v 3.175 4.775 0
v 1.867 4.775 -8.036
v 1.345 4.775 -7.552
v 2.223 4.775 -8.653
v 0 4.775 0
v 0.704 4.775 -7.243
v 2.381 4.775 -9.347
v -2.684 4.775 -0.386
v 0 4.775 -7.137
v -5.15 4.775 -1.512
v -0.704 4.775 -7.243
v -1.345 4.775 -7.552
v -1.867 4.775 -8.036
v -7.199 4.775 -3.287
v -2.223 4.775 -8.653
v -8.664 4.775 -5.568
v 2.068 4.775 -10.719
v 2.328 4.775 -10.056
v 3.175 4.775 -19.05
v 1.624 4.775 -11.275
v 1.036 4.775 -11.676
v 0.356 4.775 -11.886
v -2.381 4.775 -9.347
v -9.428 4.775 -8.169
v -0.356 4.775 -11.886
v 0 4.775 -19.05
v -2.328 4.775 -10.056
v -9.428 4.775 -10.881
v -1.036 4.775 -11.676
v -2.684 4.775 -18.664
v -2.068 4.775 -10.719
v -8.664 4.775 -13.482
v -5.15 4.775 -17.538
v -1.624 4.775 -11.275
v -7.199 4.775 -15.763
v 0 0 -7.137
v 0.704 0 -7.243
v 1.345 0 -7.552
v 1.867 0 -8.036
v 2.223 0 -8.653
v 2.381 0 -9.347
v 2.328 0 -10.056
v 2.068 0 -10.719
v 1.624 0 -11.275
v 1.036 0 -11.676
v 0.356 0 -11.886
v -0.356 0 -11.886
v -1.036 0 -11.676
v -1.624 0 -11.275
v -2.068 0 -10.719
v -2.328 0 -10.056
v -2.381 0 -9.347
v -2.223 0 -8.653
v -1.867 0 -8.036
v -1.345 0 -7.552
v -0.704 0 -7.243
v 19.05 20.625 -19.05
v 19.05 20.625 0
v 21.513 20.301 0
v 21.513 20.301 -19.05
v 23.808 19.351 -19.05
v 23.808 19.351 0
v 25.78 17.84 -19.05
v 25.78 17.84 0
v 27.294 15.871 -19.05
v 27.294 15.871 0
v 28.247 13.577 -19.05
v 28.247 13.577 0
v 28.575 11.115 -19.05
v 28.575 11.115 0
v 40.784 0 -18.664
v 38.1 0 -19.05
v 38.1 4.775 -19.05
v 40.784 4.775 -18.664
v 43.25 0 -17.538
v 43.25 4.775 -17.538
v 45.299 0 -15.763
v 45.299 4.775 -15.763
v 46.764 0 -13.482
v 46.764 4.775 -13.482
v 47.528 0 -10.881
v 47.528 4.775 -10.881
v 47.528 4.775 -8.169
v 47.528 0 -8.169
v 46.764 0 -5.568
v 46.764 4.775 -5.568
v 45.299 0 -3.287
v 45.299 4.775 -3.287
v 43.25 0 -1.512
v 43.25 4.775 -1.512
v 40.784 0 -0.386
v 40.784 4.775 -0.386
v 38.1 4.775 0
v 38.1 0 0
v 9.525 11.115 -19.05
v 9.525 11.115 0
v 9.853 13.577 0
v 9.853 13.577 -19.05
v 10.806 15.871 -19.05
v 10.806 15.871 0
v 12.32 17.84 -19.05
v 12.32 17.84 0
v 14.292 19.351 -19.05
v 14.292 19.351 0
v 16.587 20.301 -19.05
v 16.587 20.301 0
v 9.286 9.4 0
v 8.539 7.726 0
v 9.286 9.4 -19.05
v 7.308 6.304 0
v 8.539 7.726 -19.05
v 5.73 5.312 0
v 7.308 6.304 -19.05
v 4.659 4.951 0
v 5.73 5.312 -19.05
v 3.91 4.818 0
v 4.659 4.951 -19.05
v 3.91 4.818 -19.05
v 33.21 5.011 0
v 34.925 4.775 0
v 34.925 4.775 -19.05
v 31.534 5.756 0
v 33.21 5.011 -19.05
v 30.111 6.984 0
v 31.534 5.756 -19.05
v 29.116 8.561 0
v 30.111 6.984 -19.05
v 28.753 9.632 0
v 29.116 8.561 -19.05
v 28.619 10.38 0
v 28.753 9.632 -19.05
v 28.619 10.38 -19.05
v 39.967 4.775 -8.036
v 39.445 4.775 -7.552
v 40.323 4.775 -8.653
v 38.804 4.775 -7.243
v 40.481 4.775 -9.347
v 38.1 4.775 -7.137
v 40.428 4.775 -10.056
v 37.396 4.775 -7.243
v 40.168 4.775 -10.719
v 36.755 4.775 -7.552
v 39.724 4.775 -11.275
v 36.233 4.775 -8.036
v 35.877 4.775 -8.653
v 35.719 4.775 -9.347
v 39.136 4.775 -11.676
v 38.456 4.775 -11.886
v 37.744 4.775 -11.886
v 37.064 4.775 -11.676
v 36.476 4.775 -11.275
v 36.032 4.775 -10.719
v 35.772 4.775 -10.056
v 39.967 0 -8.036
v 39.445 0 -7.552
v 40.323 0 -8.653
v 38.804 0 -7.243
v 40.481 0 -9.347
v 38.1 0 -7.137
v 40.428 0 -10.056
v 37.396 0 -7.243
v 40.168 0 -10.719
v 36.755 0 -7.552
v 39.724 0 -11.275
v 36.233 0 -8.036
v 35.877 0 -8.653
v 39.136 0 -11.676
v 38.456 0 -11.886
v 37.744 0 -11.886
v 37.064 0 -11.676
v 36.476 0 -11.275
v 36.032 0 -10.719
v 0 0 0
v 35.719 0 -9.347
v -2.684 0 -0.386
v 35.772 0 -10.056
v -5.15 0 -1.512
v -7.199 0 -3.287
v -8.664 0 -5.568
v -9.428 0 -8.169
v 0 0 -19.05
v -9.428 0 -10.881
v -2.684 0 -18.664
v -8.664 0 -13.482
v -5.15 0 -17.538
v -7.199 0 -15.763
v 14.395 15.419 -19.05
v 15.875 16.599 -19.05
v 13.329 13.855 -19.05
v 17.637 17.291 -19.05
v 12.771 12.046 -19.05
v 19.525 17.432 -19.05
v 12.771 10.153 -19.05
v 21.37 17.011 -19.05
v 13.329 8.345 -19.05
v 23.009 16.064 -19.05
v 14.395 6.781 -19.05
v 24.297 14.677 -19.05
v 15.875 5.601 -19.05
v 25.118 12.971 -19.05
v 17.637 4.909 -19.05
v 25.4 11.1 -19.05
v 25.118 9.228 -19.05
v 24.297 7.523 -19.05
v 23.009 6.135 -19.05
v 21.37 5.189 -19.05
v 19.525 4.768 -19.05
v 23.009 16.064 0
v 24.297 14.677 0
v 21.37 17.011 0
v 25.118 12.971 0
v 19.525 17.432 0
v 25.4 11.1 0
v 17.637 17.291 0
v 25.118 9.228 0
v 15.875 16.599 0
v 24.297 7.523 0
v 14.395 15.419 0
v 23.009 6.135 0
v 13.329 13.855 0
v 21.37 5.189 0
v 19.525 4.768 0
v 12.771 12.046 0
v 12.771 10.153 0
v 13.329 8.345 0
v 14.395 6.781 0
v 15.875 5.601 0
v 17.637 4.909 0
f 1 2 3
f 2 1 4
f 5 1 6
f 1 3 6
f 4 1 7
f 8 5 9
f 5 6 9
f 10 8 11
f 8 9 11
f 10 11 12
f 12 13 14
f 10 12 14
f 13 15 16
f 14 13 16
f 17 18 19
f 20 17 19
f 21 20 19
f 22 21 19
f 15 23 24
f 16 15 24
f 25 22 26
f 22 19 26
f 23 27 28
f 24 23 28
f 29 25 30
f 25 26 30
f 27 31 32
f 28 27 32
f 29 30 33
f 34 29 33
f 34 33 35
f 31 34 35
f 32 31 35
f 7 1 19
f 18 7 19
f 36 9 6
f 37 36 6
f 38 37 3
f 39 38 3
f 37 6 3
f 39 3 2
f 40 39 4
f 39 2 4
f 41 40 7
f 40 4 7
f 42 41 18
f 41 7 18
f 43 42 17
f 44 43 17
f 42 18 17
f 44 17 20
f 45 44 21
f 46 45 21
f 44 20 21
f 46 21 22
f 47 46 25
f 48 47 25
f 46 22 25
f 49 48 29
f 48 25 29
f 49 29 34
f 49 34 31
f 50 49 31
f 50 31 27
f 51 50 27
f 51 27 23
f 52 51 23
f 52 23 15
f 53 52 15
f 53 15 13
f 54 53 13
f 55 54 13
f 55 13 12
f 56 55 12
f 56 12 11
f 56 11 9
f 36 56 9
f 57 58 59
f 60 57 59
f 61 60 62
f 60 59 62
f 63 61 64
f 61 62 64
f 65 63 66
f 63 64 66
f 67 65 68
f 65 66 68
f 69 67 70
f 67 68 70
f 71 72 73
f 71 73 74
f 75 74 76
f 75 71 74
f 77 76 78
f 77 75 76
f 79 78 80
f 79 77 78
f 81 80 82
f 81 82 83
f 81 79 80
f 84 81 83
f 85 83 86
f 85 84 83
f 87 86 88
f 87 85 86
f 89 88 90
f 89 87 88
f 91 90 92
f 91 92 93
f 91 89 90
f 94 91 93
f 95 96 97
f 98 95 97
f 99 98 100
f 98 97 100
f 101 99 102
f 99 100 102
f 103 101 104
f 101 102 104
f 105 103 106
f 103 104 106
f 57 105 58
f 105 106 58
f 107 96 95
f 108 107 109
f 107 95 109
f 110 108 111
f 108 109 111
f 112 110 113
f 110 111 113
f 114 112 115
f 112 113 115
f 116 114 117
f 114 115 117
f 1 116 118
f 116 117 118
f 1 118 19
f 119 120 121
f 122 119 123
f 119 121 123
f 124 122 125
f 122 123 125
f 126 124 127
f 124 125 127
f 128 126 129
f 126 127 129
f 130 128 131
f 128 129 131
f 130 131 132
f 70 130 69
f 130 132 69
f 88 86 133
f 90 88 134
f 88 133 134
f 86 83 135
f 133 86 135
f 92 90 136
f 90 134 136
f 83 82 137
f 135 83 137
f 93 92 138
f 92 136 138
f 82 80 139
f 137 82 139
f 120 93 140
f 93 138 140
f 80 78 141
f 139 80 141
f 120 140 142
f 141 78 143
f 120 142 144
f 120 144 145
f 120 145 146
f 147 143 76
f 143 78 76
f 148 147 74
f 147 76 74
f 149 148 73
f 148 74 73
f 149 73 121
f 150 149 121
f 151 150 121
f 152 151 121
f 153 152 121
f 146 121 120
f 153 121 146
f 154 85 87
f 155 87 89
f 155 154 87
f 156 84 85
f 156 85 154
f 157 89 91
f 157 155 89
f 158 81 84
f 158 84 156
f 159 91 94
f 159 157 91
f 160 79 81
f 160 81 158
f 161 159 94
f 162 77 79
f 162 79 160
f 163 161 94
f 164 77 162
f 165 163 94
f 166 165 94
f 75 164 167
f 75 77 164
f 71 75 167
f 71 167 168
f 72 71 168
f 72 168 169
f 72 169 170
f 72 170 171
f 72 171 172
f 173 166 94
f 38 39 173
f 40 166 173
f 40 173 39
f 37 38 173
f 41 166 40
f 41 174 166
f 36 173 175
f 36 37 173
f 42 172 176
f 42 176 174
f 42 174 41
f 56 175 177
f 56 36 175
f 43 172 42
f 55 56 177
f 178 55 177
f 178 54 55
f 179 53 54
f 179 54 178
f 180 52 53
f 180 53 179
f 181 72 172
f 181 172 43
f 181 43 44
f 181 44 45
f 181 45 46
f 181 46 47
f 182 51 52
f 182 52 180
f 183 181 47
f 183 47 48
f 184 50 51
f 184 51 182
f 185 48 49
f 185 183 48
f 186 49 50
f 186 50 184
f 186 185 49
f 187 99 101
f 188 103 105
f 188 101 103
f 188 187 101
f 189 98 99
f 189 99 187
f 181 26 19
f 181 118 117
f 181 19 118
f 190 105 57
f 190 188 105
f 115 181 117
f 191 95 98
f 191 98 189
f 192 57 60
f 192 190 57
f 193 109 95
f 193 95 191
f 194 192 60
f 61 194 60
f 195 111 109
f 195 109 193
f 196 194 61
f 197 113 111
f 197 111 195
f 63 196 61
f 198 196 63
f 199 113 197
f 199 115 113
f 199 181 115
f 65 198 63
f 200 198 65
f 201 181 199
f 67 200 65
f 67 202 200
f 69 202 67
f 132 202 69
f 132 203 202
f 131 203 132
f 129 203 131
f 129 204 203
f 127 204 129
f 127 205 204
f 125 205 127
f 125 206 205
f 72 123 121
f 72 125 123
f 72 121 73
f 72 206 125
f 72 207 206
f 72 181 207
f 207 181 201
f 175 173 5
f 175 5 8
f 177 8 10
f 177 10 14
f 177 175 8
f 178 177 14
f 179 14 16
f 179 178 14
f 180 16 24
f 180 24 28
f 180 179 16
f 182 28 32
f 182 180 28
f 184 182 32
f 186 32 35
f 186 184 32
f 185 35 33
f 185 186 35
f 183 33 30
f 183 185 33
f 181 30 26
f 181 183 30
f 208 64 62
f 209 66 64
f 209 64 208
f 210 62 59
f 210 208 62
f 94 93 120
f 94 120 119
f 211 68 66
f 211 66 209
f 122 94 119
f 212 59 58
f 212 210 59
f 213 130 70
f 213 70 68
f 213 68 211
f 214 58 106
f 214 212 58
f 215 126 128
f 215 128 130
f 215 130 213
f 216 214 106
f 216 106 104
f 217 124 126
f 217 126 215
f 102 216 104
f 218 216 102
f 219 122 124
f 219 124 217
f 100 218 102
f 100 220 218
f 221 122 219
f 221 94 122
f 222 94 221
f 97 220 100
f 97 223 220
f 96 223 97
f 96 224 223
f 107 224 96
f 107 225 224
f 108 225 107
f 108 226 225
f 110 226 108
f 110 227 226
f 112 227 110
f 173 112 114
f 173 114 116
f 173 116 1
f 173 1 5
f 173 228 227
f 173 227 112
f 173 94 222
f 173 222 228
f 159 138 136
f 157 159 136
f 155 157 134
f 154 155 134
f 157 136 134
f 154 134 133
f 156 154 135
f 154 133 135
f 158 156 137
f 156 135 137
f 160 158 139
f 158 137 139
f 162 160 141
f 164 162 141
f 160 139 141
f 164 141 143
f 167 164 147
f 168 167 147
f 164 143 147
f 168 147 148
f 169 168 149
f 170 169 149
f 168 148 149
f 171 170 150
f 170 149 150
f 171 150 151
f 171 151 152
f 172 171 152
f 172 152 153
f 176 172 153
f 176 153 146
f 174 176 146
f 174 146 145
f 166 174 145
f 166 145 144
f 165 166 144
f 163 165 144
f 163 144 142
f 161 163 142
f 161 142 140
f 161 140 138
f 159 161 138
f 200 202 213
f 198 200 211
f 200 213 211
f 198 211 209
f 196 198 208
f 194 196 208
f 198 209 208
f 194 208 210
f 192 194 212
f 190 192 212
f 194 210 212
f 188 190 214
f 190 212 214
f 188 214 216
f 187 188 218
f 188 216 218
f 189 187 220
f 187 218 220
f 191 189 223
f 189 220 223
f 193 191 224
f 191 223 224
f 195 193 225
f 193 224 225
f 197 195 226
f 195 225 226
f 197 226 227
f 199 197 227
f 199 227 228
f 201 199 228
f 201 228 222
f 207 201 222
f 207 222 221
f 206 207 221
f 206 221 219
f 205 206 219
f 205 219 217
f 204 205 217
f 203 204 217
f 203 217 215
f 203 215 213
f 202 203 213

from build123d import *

# Parameters (mm, degrees)
BOSS_EXTRUDE1_DEPTH = 4.7752
SKETCH3_R           = 2.3876
CUT_EXTRUDE1_DEPTH  = 52.515489516
SKETCH4_W           = 19.05
SKETCH4_H           = 19.05
BOSS_EXTRUDE2_DEPTH = 15.8496
SKETCH5_R           = 6.35
CUT_EXTRUDE3_DEPTH  = 56.284948223
FILLET1_R           = 6.35
FILLET2_R           = 6.35


with BuildPart() as part:
    # Sketch1 → Boss-Extrude1 (new body)
    with BuildSketch(Plane(origin=(0, 0, 0), x_dir=(1, 0, 0), z_dir=(0, 1, 0))):
        with BuildLine():
            Line((0, 19.05), (38.1, 19.05))
            ThreePointArc((38.1, 19.05), (47.625, 9.525), (38.1, 0))
            Line((38.1, 0), (0, 0))
            ThreePointArc((0, 0), (-9.525, 9.525), (0, 19.05))
        make_face()
    extrude(amount=BOSS_EXTRUDE1_DEPTH)

    # Sketch3 → Cut-Extrude1 (cut, through all)
    with BuildSketch(Plane(origin=(0, 4.7752, 0), x_dir=(1, 0, 0), z_dir=(0, 1, 0))):
        with Locations(Location((38.1, 9.525, 0), (0, 0, 270))):
            Circle(SKETCH3_R)
        with Locations(Location((0, 9.525, 0), (0, 0, 270))):
            Circle(SKETCH3_R)
    extrude(amount=-CUT_EXTRUDE1_DEPTH, mode=Mode.SUBTRACT)

    # Sketch4 → Boss-Extrude2 (add)
    with BuildSketch(Plane(origin=(0, 4.7752, 0), x_dir=(1, 0, 0), z_dir=(0, 1, 0))):
        with Locations((19.05, 9.525)):
            Rectangle(SKETCH4_W, SKETCH4_H)
    extrude(amount=BOSS_EXTRUDE2_DEPTH)

    # Sketch5 → Cut-Extrude3 (cut, through all)
    with BuildSketch(Plane.XY):
        with BuildLine():
            ThreePointArc((19.05, 20.6248), (25.785192091, 17.834992091), (28.575, 11.0998))
            Line((28.575, 11.0998), (28.575, 20.6248))
            Line((28.575, 20.6248), (19.05, 20.6248))
        make_face()
        with BuildLine():
            ThreePointArc((9.525, 11.0998), (12.314807909, 17.834992091), (19.05, 20.6248))
            Line((19.05, 20.6248), (9.525, 20.6248))
            Line((9.525, 20.6248), (9.525, 11.0998))
        make_face()
        with Locations((19.05, 11.0998)):
            Circle(SKETCH5_R)
    extrude(amount=-CUT_EXTRUDE3_DEPTH, mode=Mode.SUBTRACT)

    # Fillet1
    fillet1_edges = [part.edges().sort_by_distance(p)[0] for p in [
        (28.575, 4.7752, -9.525),
    ]]
    fillet(fillet1_edges, radius=FILLET1_R)

    # Fillet2
    fillet2_edges = [part.edges().sort_by_distance(p)[0] for p in [
        (9.525, 4.7752, -9.525),
    ]]
    fillet(fillet2_edges, radius=FILLET2_R)


solid = part.part
